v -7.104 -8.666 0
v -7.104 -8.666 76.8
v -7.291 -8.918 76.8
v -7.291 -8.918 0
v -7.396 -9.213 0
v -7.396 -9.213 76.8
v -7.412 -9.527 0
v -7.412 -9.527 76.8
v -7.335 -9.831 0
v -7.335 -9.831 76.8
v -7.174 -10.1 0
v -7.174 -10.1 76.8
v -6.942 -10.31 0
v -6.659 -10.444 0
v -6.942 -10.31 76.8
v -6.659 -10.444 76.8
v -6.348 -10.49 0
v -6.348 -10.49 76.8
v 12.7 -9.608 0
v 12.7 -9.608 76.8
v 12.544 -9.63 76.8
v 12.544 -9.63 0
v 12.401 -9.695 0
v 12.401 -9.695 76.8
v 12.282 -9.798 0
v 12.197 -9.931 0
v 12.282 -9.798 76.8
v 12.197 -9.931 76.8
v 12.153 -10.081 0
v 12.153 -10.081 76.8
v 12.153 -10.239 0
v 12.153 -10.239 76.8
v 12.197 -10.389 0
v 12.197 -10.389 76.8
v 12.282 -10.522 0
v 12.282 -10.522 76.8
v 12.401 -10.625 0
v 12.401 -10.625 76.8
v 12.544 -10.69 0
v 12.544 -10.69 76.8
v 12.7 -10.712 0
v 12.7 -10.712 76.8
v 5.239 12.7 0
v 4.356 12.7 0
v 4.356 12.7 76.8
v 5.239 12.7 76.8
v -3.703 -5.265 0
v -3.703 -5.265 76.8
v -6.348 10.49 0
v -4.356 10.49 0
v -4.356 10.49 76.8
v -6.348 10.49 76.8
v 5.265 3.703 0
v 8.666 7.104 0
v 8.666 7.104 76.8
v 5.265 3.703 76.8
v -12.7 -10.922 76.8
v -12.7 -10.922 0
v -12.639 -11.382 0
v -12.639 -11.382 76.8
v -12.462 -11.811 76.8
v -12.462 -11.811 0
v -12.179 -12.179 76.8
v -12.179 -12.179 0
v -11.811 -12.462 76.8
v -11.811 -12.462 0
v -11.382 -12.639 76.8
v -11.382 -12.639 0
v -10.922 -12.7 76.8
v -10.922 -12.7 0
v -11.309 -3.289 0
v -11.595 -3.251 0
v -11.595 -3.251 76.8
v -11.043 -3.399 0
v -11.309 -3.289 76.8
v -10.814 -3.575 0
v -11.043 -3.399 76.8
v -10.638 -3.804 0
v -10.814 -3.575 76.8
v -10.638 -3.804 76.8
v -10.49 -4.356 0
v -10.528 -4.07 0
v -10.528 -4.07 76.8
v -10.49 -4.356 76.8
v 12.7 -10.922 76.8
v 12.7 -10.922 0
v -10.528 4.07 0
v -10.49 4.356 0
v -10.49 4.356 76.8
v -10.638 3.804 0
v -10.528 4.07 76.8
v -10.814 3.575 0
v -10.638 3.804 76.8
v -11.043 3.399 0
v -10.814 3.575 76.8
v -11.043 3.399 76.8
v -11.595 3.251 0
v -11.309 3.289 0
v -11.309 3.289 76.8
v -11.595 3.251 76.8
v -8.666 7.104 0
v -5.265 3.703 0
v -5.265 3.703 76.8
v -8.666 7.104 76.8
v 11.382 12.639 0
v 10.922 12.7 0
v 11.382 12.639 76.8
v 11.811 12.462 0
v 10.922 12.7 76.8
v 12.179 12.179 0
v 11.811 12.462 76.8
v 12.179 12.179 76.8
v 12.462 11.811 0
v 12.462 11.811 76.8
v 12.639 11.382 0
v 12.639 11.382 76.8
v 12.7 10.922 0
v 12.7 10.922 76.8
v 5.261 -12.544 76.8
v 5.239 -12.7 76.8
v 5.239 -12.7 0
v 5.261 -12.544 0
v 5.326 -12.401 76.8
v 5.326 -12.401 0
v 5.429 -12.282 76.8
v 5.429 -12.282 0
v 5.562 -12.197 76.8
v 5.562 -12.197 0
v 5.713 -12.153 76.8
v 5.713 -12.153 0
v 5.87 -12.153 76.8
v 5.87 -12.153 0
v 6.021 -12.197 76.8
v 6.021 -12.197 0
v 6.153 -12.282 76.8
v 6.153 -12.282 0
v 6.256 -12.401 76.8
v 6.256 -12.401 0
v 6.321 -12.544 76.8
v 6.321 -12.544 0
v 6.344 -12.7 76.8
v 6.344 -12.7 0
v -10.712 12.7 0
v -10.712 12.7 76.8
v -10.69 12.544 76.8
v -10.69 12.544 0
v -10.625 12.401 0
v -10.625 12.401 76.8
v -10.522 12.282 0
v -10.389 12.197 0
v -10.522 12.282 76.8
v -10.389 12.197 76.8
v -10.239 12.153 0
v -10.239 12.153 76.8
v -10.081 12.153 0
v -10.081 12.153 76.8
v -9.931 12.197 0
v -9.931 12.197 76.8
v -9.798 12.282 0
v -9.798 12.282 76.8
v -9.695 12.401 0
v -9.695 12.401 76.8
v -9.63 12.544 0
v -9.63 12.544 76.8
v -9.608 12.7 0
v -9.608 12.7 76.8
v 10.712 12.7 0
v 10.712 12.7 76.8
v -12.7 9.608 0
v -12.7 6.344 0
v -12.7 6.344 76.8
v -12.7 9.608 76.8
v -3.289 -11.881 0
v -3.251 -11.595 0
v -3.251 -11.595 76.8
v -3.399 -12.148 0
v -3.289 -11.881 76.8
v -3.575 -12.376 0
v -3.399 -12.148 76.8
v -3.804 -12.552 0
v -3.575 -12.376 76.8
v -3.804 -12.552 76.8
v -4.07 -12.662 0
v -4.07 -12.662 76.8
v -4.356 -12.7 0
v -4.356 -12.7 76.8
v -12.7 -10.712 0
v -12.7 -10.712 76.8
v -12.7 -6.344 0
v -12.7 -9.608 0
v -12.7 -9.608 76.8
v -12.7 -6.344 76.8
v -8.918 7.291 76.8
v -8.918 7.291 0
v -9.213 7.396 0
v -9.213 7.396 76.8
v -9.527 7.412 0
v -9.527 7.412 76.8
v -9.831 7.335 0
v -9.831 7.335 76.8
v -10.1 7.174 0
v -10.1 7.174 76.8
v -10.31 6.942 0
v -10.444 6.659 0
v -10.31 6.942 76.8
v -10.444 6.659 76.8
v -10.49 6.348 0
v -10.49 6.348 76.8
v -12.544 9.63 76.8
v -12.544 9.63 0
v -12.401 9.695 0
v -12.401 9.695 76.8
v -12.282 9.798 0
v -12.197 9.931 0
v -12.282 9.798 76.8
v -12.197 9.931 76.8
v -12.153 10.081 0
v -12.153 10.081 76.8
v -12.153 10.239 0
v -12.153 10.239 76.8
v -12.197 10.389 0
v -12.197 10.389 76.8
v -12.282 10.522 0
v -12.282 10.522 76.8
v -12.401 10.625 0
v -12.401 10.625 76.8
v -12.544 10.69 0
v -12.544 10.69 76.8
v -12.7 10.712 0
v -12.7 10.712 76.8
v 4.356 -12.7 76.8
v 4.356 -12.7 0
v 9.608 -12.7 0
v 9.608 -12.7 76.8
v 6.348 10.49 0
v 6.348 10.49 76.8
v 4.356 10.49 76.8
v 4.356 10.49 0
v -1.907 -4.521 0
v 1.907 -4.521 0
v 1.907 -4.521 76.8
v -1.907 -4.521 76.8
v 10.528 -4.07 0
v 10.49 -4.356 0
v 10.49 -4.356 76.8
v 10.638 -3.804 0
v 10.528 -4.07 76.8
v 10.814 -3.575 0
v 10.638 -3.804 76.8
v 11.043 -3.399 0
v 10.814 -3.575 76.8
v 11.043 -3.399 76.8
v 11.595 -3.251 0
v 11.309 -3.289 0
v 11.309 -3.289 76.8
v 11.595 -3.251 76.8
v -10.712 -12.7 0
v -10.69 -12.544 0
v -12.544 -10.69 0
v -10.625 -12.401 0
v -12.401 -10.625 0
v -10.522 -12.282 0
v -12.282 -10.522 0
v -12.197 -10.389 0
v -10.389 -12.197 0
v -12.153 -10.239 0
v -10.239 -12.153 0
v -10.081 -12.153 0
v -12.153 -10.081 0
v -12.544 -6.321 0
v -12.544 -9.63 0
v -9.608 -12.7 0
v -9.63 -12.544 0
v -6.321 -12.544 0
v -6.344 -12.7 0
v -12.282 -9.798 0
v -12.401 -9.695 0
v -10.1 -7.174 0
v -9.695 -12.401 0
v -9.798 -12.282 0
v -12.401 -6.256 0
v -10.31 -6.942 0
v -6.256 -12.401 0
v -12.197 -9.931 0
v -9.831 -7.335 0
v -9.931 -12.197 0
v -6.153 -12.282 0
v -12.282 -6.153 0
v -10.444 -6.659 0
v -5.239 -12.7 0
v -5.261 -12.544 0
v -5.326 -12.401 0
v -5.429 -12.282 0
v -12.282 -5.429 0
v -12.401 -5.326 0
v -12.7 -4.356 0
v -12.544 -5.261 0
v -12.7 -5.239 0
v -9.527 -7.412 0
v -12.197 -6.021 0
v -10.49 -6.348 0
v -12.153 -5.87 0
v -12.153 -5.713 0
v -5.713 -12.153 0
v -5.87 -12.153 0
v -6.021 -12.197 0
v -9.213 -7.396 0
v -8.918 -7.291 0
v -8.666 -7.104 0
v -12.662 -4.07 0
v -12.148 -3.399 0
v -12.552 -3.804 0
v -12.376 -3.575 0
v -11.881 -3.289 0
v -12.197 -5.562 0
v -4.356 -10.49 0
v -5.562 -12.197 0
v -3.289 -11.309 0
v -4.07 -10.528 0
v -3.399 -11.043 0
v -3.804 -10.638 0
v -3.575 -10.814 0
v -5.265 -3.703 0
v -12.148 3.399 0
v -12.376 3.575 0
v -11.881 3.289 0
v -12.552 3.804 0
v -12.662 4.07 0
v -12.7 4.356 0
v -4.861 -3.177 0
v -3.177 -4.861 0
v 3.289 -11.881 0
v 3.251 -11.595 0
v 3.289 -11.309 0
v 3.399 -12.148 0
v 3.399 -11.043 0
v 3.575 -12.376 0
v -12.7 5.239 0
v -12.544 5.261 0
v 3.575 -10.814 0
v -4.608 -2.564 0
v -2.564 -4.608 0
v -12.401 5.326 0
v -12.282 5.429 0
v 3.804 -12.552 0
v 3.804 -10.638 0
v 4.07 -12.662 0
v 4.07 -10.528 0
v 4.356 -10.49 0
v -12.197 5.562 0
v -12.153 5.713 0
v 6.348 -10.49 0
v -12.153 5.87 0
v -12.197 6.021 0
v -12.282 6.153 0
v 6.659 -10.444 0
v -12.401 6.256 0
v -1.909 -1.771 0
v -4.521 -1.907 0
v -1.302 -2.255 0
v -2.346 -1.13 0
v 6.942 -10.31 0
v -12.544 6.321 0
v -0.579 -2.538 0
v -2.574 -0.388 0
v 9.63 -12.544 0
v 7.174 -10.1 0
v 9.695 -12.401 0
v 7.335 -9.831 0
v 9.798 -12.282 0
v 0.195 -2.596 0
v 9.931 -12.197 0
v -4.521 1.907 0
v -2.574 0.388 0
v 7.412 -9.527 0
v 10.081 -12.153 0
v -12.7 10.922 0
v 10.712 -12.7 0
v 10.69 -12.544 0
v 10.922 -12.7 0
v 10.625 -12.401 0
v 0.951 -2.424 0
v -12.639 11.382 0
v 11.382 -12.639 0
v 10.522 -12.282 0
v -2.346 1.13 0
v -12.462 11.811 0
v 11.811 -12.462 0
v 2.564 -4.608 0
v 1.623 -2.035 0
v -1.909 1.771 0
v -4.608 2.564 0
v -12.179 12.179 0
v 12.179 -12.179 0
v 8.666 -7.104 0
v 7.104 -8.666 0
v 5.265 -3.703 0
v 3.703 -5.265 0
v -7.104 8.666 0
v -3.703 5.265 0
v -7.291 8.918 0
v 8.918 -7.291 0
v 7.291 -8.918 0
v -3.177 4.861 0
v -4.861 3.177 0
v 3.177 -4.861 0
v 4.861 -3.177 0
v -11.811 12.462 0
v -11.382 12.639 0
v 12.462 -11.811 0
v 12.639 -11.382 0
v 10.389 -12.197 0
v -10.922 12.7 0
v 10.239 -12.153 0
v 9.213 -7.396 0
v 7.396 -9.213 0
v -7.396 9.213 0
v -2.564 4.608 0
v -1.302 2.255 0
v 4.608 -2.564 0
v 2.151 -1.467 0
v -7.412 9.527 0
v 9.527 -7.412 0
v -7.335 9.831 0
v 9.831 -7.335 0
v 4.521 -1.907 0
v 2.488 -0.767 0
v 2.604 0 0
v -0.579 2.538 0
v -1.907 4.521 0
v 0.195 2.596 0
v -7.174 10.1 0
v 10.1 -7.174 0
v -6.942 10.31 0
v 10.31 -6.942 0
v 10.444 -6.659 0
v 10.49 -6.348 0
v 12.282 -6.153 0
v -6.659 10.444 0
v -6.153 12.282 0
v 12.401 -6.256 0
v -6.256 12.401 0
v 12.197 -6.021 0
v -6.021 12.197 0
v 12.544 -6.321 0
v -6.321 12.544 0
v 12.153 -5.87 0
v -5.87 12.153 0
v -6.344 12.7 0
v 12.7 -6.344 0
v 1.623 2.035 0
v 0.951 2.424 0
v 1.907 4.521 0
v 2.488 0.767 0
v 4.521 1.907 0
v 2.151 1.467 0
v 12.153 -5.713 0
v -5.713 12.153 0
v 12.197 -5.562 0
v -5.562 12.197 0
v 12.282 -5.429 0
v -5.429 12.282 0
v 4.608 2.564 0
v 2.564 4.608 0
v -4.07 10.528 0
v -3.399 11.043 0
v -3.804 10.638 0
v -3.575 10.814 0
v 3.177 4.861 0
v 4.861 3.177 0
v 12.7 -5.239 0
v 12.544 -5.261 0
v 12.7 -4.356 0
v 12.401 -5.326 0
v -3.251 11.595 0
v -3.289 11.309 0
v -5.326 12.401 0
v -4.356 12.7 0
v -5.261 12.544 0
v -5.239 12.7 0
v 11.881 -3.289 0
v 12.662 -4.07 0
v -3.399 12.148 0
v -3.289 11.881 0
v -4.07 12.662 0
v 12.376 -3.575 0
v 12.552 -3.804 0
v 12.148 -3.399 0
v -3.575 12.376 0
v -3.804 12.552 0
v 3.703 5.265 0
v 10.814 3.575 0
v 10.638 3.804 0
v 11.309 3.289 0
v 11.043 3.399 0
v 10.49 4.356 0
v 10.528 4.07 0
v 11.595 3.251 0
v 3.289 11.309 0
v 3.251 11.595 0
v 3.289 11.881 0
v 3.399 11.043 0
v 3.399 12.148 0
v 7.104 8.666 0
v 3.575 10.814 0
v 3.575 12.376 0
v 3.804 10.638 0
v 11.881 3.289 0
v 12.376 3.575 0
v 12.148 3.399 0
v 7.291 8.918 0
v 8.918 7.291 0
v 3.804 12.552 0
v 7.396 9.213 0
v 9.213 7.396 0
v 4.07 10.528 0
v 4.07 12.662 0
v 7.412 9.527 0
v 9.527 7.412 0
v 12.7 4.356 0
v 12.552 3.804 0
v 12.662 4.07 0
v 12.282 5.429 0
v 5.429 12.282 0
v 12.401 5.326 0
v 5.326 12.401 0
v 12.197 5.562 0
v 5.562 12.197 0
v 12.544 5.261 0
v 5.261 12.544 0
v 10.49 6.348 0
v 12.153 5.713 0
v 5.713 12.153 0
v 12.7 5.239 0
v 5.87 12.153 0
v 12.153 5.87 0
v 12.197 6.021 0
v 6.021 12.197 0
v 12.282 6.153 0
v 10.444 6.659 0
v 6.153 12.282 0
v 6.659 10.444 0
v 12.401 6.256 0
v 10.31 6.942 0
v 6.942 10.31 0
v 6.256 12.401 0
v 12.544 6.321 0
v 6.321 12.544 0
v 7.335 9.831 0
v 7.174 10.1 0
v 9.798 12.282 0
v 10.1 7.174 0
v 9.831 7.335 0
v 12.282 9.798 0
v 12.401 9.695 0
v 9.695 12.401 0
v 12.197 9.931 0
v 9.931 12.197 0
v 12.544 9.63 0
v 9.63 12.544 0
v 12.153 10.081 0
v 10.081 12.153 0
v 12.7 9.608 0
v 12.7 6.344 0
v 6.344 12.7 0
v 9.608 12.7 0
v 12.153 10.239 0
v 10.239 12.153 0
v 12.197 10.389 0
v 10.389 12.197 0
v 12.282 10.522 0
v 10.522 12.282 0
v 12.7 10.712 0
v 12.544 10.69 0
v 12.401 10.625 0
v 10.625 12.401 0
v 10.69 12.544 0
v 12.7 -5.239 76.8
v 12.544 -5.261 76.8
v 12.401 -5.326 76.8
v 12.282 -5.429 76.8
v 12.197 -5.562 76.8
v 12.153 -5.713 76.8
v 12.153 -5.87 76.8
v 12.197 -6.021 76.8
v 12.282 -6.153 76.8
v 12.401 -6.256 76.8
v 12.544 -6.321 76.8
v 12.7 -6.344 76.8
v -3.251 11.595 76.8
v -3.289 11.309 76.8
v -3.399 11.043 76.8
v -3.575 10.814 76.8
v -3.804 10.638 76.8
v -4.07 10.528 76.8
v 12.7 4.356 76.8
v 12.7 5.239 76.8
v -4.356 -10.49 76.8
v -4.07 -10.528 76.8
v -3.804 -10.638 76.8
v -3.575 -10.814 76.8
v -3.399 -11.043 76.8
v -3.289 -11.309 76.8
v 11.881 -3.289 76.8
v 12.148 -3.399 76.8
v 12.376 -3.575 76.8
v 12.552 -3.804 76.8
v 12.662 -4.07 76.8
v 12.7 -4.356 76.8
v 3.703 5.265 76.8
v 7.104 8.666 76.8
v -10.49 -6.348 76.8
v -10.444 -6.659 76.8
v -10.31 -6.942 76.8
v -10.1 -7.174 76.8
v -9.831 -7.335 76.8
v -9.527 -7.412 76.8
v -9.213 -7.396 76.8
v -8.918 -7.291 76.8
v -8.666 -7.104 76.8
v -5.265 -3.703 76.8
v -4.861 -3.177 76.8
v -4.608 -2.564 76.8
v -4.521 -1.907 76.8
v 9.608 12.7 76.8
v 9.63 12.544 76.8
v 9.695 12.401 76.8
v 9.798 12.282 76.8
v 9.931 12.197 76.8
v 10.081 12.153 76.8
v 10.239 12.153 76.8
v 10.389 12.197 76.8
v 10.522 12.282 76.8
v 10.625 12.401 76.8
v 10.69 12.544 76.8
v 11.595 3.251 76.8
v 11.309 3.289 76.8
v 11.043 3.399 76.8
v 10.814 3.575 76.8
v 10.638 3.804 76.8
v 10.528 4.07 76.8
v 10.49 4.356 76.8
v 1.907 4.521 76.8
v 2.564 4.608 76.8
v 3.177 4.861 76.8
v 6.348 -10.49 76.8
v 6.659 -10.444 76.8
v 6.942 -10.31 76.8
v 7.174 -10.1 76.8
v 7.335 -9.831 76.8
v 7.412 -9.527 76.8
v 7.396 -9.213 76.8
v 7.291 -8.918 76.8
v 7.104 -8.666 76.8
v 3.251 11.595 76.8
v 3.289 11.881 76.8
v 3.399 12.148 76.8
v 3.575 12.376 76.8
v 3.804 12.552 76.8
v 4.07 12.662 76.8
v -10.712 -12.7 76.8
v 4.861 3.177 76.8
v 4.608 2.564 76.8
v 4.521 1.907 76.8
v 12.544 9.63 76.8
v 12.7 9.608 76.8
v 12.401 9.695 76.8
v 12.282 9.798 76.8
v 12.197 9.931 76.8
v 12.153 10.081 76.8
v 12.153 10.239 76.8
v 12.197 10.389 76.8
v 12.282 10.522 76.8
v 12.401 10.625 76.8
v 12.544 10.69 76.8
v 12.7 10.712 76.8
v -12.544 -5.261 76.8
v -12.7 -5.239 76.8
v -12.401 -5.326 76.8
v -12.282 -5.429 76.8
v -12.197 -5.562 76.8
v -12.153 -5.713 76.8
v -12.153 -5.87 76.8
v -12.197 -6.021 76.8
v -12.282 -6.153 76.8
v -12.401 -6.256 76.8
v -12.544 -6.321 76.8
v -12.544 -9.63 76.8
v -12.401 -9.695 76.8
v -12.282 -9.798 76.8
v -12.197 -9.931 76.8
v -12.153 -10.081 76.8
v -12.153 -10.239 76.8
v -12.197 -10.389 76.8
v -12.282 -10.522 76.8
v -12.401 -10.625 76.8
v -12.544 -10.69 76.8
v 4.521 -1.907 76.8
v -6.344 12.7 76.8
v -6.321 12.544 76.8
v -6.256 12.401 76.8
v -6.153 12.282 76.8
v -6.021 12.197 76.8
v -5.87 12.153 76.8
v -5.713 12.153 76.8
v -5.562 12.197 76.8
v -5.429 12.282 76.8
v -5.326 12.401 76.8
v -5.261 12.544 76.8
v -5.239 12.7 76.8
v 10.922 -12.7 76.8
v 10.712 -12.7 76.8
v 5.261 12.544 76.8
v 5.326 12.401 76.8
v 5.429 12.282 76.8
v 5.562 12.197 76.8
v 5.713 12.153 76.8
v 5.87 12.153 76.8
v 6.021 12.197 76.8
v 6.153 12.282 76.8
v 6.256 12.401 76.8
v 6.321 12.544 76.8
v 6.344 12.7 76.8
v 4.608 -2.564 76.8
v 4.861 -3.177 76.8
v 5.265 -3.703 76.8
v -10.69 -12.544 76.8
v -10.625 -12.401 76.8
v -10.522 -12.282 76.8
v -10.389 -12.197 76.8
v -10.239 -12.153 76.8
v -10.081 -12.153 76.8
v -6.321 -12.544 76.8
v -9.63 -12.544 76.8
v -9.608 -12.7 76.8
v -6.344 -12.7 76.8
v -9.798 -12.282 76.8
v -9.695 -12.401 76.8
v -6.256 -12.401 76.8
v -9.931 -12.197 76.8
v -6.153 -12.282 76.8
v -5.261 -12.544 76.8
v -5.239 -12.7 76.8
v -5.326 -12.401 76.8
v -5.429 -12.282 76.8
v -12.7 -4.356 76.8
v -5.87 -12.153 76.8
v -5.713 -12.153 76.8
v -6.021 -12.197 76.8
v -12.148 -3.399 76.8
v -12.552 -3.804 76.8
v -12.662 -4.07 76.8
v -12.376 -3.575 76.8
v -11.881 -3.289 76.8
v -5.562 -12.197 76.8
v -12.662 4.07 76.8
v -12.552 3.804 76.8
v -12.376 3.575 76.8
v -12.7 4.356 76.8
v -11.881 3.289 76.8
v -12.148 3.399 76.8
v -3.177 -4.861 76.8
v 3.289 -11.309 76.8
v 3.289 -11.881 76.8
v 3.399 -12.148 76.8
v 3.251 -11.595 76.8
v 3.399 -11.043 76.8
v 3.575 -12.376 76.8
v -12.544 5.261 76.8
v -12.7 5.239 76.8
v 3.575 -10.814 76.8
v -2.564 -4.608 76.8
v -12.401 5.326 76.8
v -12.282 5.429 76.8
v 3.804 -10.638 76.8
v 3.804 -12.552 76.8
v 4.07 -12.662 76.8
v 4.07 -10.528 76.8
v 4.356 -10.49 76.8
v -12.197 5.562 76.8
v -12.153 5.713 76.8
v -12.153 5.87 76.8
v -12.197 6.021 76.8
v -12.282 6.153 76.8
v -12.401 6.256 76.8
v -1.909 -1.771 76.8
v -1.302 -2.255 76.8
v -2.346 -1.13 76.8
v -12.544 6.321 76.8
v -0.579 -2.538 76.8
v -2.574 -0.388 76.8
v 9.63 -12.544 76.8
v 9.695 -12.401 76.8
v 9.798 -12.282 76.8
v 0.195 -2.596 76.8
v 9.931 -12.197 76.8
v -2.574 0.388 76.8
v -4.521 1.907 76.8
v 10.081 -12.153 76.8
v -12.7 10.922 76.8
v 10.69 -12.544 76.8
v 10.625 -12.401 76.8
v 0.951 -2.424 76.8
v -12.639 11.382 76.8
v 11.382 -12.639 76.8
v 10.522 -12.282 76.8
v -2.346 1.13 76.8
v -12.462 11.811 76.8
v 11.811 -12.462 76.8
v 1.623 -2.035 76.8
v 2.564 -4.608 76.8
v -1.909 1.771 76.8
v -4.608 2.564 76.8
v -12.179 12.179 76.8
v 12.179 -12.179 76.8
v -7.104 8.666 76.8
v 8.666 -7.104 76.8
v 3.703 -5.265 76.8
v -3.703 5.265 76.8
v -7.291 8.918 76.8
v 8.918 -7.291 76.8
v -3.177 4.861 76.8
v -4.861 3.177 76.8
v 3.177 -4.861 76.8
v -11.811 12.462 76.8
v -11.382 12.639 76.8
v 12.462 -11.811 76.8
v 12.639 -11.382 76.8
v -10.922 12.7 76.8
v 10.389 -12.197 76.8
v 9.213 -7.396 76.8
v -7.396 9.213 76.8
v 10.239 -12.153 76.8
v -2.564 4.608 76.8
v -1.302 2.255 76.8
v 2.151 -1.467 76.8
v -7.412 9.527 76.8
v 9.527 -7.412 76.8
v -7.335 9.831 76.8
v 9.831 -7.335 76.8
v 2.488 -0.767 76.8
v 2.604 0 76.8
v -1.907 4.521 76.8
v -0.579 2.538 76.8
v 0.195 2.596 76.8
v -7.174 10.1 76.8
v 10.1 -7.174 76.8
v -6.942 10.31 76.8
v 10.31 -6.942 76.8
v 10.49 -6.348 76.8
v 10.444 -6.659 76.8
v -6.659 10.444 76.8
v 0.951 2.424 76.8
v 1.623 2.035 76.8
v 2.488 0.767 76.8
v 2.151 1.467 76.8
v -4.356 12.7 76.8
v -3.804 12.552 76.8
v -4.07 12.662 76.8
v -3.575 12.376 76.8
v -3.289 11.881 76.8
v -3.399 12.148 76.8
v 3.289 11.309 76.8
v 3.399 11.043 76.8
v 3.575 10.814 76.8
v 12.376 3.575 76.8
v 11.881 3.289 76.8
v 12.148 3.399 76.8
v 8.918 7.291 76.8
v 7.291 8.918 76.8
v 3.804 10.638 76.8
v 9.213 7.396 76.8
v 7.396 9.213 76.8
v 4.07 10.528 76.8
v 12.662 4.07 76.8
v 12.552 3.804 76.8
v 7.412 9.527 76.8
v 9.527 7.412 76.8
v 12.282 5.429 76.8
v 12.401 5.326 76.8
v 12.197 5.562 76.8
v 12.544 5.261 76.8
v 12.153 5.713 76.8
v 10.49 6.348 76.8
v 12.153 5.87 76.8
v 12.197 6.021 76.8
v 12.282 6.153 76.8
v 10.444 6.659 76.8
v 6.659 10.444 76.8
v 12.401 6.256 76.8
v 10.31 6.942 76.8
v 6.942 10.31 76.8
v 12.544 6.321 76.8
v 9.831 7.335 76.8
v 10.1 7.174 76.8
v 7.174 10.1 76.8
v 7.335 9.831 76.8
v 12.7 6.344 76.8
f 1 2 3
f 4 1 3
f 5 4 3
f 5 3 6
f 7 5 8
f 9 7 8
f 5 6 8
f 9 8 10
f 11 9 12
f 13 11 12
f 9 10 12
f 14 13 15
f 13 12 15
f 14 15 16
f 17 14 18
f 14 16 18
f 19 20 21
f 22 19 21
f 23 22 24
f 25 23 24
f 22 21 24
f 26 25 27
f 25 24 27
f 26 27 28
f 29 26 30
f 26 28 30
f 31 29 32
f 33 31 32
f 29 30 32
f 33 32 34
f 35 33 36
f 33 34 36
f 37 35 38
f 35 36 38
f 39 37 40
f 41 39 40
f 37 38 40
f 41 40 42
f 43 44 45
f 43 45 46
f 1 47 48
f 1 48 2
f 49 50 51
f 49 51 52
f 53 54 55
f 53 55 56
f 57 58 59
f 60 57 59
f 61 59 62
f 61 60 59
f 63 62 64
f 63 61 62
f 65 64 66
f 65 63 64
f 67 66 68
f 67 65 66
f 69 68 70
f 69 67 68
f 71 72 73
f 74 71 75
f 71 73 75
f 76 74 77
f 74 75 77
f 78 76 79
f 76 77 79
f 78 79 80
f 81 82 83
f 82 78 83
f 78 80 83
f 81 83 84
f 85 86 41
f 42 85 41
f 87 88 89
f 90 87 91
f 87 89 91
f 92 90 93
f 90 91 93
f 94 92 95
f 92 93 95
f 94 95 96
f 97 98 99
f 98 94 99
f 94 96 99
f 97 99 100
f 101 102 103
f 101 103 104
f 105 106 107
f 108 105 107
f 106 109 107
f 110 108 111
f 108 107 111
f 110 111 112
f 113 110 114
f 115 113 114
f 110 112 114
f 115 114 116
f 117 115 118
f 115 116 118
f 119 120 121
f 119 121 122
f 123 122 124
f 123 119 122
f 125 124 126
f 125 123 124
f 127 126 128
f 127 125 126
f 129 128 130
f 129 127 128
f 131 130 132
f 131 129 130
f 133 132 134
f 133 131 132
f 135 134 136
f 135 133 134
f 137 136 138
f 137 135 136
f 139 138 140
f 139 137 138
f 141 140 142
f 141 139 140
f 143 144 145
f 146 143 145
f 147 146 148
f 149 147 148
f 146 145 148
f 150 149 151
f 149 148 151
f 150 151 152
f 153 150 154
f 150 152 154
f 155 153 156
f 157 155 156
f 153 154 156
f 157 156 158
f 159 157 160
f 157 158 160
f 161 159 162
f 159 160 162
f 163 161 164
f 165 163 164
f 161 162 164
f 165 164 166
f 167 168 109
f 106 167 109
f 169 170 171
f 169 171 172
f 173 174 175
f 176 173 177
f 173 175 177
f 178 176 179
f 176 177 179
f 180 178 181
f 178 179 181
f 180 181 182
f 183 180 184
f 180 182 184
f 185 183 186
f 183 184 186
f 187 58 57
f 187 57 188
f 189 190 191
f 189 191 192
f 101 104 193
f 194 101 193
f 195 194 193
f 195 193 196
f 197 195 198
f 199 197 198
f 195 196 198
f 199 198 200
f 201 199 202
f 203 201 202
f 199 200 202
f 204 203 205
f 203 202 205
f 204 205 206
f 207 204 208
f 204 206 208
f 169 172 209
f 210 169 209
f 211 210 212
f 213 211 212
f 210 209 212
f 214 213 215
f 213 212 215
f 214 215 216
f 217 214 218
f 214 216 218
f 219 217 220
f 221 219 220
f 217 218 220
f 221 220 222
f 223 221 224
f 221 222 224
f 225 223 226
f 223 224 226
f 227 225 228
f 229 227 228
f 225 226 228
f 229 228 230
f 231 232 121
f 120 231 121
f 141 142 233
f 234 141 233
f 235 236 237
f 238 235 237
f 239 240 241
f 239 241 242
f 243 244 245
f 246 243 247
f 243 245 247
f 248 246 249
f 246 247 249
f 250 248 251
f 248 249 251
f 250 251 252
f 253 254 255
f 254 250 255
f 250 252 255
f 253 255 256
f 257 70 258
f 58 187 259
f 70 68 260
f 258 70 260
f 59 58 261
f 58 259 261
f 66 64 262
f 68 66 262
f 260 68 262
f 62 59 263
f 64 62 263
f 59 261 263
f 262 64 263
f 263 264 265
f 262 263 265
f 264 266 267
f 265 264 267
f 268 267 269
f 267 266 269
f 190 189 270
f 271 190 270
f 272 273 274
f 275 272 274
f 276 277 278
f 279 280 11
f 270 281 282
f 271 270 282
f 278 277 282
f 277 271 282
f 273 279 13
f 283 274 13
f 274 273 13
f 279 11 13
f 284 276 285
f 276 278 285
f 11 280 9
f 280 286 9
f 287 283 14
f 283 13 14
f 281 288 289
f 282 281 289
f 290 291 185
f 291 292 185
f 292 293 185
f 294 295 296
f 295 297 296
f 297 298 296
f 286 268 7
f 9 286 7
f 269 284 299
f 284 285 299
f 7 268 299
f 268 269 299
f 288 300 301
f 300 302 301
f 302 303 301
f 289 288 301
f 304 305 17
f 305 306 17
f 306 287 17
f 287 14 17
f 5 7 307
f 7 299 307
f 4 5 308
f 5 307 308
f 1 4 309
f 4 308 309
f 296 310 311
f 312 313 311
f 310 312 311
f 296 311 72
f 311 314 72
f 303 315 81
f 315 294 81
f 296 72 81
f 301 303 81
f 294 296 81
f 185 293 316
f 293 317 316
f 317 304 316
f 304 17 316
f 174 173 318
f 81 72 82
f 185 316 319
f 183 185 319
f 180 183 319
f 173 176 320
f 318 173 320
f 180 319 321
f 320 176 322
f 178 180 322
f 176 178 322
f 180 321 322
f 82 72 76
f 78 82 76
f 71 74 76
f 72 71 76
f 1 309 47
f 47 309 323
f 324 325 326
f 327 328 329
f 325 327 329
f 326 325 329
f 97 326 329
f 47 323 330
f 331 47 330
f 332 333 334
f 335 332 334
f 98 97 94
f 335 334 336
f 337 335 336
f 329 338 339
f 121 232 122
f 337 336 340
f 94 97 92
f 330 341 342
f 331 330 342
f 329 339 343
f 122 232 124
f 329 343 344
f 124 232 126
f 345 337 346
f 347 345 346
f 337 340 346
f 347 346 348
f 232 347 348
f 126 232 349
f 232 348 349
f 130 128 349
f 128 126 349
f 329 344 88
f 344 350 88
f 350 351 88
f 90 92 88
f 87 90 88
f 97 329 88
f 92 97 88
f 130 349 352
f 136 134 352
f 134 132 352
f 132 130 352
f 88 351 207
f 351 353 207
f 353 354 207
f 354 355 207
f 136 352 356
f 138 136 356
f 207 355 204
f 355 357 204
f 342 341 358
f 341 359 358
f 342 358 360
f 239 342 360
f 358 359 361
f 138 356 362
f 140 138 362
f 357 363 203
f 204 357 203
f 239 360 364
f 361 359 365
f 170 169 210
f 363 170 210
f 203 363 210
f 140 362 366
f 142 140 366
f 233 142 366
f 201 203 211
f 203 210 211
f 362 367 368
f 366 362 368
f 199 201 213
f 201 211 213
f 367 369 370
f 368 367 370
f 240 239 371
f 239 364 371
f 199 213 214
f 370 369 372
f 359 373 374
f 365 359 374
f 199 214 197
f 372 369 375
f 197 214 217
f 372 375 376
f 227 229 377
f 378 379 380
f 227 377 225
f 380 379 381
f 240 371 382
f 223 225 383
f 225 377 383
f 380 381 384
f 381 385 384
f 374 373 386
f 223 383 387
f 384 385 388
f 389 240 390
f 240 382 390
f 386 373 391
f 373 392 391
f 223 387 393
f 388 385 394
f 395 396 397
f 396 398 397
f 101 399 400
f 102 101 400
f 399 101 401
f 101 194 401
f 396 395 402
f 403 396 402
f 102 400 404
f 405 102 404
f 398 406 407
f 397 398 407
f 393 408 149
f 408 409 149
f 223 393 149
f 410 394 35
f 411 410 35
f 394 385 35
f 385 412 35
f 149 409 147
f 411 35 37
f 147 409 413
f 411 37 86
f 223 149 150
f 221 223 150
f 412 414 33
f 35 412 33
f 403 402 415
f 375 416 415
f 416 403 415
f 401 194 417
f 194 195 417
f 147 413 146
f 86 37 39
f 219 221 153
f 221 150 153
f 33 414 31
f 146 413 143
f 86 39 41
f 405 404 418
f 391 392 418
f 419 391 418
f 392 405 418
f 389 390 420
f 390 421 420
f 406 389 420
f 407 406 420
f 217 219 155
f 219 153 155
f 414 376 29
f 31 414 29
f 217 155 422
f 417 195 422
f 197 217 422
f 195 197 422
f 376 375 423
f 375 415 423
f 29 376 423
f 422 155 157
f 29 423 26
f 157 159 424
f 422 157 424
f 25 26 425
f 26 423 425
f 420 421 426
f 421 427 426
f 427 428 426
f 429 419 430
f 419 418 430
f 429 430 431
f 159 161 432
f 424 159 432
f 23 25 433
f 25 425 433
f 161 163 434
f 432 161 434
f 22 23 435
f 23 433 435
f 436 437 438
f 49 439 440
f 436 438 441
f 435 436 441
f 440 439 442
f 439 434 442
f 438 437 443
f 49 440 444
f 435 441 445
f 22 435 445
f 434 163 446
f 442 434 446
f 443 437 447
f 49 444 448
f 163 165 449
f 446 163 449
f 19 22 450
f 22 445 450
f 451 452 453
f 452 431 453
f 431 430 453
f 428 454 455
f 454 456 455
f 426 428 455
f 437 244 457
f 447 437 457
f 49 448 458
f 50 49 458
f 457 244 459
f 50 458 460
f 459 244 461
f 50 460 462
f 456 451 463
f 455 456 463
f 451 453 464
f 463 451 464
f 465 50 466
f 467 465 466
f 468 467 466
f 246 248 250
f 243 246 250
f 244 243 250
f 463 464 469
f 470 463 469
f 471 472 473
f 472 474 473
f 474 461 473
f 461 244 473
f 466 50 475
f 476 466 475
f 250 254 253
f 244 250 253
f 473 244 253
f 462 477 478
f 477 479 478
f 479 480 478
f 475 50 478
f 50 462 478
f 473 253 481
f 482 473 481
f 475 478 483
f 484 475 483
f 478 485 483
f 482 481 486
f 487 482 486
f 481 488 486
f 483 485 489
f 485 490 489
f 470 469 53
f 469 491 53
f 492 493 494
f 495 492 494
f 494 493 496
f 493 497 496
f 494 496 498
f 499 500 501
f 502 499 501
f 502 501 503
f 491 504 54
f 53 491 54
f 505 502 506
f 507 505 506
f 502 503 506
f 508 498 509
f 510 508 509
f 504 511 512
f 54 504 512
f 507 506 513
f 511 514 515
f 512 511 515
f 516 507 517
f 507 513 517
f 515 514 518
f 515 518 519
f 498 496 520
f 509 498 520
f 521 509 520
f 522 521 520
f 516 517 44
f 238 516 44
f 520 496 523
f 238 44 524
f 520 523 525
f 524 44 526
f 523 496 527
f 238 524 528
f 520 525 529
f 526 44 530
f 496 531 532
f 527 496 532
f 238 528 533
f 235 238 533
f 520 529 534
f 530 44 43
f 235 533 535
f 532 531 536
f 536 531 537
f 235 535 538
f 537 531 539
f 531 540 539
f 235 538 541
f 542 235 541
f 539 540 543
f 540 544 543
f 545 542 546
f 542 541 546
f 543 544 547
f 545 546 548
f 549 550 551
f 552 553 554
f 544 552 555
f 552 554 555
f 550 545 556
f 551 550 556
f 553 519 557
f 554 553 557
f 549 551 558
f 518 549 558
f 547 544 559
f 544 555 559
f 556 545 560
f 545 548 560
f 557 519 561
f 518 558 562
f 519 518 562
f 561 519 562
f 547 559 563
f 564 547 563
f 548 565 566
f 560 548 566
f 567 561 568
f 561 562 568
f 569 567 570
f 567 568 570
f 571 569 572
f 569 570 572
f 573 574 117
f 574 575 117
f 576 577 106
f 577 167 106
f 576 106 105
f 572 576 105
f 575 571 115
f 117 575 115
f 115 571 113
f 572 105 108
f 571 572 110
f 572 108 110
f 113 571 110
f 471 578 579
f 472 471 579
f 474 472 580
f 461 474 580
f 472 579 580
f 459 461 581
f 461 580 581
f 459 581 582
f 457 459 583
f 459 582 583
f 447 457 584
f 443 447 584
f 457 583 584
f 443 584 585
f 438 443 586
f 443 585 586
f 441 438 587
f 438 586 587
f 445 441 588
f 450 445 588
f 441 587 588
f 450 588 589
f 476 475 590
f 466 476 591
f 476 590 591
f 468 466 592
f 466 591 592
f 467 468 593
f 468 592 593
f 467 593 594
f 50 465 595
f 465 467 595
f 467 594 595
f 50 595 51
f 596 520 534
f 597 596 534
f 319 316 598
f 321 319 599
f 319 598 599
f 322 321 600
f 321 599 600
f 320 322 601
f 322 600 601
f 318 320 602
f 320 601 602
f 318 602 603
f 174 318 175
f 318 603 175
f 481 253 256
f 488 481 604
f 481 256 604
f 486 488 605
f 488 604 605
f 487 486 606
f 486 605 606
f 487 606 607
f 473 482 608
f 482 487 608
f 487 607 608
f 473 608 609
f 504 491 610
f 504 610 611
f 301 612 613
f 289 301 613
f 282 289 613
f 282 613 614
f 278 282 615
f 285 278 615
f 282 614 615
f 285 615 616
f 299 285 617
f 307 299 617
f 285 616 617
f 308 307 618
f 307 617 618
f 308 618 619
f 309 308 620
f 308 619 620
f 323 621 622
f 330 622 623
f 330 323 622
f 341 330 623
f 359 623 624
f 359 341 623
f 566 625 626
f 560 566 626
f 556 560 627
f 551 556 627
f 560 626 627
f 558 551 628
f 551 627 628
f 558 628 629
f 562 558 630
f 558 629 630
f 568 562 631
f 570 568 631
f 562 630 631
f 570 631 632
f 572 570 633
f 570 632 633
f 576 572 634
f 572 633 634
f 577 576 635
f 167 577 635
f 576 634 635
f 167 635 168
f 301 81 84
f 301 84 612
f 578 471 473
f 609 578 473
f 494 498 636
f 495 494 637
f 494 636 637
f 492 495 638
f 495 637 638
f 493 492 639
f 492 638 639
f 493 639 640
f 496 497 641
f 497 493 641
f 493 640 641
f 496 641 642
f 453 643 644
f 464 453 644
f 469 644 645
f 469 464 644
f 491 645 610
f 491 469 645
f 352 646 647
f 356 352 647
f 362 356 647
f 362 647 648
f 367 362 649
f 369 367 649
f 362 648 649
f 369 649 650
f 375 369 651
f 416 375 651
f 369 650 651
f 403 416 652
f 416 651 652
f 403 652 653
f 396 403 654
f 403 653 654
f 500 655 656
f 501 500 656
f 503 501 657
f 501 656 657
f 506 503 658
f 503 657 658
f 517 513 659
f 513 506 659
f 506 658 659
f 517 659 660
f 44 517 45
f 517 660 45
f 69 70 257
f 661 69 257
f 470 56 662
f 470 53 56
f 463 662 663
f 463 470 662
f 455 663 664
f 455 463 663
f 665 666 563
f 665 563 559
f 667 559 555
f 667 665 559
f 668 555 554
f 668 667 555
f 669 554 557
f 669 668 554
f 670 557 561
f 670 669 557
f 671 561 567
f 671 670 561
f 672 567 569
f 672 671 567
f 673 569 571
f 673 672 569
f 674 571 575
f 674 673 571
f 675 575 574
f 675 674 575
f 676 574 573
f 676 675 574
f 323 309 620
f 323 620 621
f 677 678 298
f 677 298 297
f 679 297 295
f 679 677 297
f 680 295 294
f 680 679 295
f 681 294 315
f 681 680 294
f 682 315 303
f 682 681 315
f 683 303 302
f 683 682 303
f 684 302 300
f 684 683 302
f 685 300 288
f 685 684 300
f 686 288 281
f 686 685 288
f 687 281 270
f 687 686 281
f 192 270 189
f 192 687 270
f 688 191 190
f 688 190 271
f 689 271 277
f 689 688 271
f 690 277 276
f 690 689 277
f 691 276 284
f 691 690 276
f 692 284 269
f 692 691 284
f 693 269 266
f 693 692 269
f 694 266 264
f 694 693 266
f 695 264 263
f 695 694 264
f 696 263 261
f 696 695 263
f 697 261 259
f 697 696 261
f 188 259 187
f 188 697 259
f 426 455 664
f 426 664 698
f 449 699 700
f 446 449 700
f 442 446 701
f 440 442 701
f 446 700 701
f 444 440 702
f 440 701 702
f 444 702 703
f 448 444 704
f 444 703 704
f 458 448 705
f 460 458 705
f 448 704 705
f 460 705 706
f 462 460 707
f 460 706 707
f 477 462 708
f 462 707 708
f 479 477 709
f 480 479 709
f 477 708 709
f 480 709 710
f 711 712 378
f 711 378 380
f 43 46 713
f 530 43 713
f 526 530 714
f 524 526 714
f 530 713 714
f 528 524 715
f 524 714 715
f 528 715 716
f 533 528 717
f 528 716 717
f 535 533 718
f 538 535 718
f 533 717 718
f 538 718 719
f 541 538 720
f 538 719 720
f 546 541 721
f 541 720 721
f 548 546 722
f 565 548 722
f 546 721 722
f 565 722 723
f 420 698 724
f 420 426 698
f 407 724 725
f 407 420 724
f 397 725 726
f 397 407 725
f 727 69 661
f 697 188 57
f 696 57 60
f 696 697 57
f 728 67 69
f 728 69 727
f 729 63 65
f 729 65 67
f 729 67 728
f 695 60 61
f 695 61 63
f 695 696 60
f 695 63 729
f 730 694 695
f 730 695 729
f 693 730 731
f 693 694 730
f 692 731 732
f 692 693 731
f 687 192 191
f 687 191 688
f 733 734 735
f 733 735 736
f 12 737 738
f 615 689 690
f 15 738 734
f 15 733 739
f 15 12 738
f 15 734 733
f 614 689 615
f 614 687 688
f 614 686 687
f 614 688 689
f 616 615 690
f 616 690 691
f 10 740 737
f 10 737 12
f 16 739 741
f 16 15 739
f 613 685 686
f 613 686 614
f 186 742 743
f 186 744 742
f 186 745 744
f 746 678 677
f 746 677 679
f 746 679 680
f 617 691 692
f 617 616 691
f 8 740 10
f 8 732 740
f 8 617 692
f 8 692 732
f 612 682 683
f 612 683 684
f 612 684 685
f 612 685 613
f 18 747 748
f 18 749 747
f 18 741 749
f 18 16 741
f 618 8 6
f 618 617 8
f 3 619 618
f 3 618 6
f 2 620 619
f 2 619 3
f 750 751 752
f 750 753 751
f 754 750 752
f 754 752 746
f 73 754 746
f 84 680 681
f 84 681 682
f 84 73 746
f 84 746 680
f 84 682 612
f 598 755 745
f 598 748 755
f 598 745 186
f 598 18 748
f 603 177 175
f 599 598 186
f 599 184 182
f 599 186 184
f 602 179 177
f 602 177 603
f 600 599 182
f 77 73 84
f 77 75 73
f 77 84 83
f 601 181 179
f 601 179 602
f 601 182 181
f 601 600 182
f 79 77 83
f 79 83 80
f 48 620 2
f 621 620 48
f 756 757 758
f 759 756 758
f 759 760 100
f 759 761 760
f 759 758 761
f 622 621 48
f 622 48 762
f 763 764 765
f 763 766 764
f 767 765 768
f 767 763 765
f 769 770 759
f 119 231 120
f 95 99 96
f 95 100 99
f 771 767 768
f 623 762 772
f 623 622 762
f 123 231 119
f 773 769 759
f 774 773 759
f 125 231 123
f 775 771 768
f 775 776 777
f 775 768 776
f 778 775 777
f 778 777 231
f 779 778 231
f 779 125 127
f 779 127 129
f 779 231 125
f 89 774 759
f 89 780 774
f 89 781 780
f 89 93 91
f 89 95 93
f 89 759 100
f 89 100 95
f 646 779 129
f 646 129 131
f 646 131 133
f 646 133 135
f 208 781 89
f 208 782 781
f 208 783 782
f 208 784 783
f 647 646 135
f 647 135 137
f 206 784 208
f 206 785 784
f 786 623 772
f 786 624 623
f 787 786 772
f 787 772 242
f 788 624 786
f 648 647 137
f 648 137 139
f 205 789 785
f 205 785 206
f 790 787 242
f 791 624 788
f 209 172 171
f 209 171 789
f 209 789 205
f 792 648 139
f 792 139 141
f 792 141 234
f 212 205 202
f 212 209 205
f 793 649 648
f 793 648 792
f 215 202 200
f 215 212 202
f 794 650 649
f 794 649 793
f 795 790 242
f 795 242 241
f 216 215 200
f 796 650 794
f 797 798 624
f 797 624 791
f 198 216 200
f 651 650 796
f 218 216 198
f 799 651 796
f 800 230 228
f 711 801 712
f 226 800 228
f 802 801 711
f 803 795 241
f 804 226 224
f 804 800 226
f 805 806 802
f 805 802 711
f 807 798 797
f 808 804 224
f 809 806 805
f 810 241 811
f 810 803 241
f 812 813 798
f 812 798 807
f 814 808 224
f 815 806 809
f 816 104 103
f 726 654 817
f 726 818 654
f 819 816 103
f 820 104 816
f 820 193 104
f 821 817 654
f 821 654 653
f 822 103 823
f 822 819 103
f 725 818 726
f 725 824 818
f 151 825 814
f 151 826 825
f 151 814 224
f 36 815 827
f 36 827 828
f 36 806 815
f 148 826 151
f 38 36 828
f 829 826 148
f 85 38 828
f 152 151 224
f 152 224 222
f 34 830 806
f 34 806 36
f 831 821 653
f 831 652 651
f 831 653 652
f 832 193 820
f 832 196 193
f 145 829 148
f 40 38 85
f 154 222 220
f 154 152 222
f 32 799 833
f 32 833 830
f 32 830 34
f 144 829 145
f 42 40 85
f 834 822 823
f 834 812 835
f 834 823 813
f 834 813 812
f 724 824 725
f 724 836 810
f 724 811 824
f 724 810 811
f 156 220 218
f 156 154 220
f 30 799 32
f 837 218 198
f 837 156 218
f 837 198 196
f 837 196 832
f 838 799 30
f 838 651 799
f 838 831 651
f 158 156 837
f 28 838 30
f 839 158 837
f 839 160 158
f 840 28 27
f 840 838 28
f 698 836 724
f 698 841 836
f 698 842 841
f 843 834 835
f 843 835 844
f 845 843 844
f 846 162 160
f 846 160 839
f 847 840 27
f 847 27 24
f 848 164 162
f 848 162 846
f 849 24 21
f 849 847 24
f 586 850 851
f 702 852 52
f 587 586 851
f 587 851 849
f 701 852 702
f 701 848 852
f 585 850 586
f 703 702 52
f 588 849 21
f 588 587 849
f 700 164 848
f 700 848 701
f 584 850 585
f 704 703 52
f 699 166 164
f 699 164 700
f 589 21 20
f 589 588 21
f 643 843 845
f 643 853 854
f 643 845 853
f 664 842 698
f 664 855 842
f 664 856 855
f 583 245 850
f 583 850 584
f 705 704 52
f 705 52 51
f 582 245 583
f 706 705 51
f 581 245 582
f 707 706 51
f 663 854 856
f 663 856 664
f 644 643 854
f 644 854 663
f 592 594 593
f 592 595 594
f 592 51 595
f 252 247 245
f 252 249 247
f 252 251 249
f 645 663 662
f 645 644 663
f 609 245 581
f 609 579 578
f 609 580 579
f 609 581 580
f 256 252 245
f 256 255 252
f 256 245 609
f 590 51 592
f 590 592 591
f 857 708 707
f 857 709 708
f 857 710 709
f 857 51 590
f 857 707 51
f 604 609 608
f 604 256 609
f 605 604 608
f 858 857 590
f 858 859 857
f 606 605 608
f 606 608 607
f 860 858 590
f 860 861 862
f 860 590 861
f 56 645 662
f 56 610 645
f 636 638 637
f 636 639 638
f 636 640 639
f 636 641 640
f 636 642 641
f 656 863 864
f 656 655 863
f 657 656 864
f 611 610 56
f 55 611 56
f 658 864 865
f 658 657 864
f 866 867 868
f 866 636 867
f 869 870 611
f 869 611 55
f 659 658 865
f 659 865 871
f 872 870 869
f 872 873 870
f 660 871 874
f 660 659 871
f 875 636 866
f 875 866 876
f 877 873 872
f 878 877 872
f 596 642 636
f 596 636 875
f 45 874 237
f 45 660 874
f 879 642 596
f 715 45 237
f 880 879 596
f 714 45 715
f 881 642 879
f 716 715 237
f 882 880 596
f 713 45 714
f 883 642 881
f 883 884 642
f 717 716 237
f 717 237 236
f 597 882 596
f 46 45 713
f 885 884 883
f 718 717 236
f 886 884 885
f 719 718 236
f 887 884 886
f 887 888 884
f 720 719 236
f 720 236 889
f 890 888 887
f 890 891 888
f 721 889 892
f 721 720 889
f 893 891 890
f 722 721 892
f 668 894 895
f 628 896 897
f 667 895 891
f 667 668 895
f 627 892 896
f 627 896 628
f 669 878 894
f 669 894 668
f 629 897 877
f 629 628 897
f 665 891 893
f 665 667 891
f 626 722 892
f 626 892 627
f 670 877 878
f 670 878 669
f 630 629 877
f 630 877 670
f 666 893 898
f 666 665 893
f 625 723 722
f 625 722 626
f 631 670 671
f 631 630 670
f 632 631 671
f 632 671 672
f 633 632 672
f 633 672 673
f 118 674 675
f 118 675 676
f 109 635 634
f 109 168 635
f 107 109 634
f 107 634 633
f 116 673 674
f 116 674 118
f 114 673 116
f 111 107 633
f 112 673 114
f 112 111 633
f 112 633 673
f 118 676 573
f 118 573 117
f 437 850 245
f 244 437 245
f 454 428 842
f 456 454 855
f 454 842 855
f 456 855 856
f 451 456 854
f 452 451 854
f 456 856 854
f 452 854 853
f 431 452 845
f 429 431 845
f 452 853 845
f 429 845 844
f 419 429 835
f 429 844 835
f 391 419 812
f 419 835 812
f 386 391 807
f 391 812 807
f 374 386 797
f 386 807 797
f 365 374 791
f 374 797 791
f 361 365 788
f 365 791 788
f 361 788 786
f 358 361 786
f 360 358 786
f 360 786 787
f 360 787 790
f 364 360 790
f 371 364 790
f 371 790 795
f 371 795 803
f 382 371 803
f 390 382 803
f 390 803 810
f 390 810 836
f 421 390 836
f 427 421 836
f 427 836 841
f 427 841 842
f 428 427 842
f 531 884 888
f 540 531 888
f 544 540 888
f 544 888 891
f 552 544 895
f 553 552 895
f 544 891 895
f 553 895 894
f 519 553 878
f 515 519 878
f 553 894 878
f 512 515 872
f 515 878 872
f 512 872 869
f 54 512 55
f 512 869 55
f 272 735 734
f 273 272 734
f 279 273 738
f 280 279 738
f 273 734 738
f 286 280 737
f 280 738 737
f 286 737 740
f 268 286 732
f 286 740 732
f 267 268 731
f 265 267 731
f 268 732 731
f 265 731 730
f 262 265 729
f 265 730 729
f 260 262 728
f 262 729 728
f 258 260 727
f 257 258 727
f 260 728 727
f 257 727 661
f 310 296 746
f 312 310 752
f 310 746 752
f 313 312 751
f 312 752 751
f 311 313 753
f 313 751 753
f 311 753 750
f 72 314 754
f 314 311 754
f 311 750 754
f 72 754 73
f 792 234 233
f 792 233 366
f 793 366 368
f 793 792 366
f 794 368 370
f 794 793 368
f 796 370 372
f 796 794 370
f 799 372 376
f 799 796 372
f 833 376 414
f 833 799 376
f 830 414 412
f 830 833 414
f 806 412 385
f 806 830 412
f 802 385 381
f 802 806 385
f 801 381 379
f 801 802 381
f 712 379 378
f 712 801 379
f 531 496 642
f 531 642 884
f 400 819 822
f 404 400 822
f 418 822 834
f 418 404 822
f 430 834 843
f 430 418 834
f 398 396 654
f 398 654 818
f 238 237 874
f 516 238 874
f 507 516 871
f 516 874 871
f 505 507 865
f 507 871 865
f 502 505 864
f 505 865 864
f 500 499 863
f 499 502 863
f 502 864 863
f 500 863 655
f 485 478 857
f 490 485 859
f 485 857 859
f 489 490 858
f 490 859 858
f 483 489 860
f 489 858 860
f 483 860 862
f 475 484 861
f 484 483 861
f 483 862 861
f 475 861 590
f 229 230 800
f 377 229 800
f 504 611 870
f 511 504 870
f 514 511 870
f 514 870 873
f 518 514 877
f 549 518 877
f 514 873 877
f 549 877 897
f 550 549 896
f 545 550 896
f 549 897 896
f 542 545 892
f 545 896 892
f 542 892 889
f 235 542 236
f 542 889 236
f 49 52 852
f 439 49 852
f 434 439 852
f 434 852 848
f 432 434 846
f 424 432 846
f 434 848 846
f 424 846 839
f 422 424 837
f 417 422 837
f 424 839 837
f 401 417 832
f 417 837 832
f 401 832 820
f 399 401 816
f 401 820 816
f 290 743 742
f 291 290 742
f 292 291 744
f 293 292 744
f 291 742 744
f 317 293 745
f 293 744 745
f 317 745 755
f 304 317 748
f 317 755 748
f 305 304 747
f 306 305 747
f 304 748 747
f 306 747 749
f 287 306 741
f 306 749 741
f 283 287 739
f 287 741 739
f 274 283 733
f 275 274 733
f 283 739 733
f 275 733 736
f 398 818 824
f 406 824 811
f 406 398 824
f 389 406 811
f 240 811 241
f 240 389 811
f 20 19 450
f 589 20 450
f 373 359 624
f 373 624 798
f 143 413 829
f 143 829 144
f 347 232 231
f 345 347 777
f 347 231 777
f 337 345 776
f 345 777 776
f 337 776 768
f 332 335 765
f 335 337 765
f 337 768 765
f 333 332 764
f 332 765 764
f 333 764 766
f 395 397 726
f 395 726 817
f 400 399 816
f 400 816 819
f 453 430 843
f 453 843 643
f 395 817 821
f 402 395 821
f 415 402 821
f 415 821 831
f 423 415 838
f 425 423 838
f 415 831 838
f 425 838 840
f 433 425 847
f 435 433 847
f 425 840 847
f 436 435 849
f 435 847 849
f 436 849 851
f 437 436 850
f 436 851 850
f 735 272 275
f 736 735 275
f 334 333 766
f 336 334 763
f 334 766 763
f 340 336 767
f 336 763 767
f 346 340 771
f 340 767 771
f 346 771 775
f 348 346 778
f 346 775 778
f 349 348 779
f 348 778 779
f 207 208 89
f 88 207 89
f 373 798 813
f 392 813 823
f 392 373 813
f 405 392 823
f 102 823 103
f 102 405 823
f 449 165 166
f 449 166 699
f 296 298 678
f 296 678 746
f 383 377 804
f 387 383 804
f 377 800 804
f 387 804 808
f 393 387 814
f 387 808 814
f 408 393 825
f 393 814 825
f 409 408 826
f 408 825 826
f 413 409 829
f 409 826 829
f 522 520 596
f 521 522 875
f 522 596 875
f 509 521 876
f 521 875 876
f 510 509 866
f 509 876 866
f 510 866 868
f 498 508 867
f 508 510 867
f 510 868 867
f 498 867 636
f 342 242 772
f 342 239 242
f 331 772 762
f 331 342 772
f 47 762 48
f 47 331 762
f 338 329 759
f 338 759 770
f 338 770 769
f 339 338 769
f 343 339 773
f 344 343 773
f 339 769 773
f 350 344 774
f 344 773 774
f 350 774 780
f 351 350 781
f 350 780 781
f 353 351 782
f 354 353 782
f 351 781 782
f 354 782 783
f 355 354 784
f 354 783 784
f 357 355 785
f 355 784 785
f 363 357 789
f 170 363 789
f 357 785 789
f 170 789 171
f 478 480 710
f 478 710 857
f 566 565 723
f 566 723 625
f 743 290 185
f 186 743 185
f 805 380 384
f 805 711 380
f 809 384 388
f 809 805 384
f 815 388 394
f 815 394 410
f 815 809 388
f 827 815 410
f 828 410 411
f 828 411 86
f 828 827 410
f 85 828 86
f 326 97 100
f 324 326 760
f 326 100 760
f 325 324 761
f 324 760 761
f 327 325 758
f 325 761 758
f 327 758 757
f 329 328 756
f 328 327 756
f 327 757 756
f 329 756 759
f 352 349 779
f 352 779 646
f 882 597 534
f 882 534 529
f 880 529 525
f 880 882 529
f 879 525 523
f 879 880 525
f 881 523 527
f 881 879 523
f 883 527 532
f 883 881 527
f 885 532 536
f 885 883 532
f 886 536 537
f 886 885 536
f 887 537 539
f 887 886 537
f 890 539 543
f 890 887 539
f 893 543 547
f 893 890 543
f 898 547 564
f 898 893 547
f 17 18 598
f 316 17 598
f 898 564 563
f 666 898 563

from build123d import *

# Parameters (mm, degrees)
SKETCH3_W           = 25.4
SKETCH3_H           = 25.4
BOSS_EXTRUDE1_DEPTH = 76.8
SKETCH4_R           = 2.6035
CUT_EXTRUDE1_DEPTH  = 79.872175068
CUT_EXTRUDE2_DEPTH  = 79.872175068
FILLET1_R           = 2.54
FILLET2_R           = 1.778


with BuildPart() as part:
    # Sketch3 → Boss-Extrude1 (new body)
    with BuildSketch(Plane.XY):
        Rectangle(SKETCH3_W, SKETCH3_H)
    extrude(amount=BOSS_EXTRUDE1_DEPTH)

    # Sketch4 → Cut-Extrude1 (cut, through all)
    with BuildSketch(Plane.XY.offset(76.8)):
        with BuildLine():
            Line((3.2512, 12.7), (-3.2512, 12.7))
            Line((-3.2512, 12.7), (-3.2512, 10.4902))
            Line((-3.2512, 10.4902), (-6.348478019, 10.4902))
            ThreePointArc((-6.348478019, 10.4902), (-7.335478831, 9.830707141), (-7.103895736, 8.666460301))
            Line((-7.103895736, 8.666460301), (-2.958635435, 4.5212))
            Line((-2.958635435, 4.5212), (2.958635435, 4.5212))
            Line((2.958635435, 4.5212), (7.103895736, 8.666460301))
            ThreePointArc((7.103895736, 8.666460301), (7.335478831, 9.830707141), (6.348478019, 10.4902))
            Line((6.348478019, 10.4902), (3.2512, 10.4902))
            Line((3.2512, 10.4902), (3.2512, 12.7))
        make_face()
        with BuildLine():
            Line((12.7, -3.2512), (12.7, 3.2512))
            Line((12.7, 3.2512), (10.4902, 3.2512))
            Line((10.4902, 3.2512), (10.4902, 6.348478019))
            ThreePointArc((10.4902, 6.348478019), (9.830707141, 7.335478831), (8.666460301, 7.103895736))
            Line((8.666460301, 7.103895736), (4.5212, 2.958635435))
            Line((4.5212, 2.958635435), (4.5212, -2.958635435))
            Line((4.5212, -2.958635435), (8.666460301, -7.103895736))
            ThreePointArc((8.666460301, -7.103895736), (9.830707141, -7.335478831), (10.4902, -6.348478019))
            Line((10.4902, -6.348478019), (10.4902, -3.2512))
            Line((10.4902, -3.2512), (12.7, -3.2512))
        make_face()
        with BuildLine():
            Line((-3.2512, -10.4902), (-3.2512, -12.7))
            Line((-3.2512, -12.7), (3.2512, -12.7))
            Line((3.2512, -12.7), (3.2512, -10.4902))
            Line((3.2512, -10.4902), (6.348478019, -10.4902))
            ThreePointArc((6.348478019, -10.4902), (7.335478831, -9.830707141), (7.103895736, -8.666460301))
            Line((7.103895736, -8.666460301), (2.958635435, -4.5212))
            Line((2.958635435, -4.5212), (-2.958635435, -4.5212))
            Line((-2.958635435, -4.5212), (-7.103895736, -8.666460301))
            ThreePointArc((-7.103895736, -8.666460301), (-7.335478831, -9.830707141), (-6.348478019, -10.4902))
            Line((-6.348478019, -10.4902), (-3.2512, -10.4902))
        make_face()
        with BuildLine():
            Line((-10.4902, 3.2512), (-12.7, 3.2512))
            Line((-12.7, 3.2512), (-12.7, -3.2512))
            Line((-12.7, -3.2512), (-10.4902, -3.2512))
            Line((-10.4902, -3.2512), (-10.4902, -6.348478019))
            ThreePointArc((-10.4902, -6.348478019), (-9.830707141, -7.335478831), (-8.666460301, -7.103895736))
            Line((-8.666460301, -7.103895736), (-4.5212, -2.958635435))
            Line((-4.5212, -2.958635435), (-4.5212, 2.958635435))
            Line((-4.5212, 2.958635435), (-8.666460301, 7.103895736))
            ThreePointArc((-8.666460301, 7.103895736), (-9.830707141, 7.335478831), (-10.4902, 6.348478019))
            Line((-10.4902, 6.348478019), (-10.4902, 3.2512))
        make_face()
        Circle(SKETCH4_R)
    extrude(amount=-CUT_EXTRUDE1_DEPTH, mode=Mode.SUBTRACT)

    # Sketch5 → Cut-Extrude2 (cut, through all)
    with BuildSketch(Plane.XY.offset(76.8)):
        with BuildLine():
            ThreePointArc((-11.5951, 3.2512), (-12.376382283, 3.574817717), (-12.7, 4.3561))
            Line((-12.7, 4.3561), (-12.7, 3.2512))
            Line((-12.7, 3.2512), (-11.5951, 3.2512))
        make_face()
        with BuildLine():
            ThreePointArc((-10.4902, 4.3561), (-10.813817717, 3.574817717), (-11.5951, 3.2512))
            Line((-11.5951, 3.2512), (-10.4902, 3.2512))
            Line((-10.4902, 3.2512), (-10.4902, 4.3561))
        make_face()
        with BuildLine():
            Line((-12.7, -3.2512), (-12.7, -4.3561))
            ThreePointArc((-12.7, -4.3561), (-12.376382283, -3.574817717), (-11.5951, -3.2512))
            Line((-11.5951, -3.2512), (-12.7, -3.2512))
        make_face()
        with BuildLine():
            Line((-10.4902, -3.2512), (-11.5951, -3.2512))
            ThreePointArc((-11.5951, -3.2512), (-10.813817717, -3.574817717), (-10.4902, -4.3561))
            Line((-10.4902, -4.3561), (-10.4902, -3.2512))
        make_face()
        with BuildLine():
            Line((-3.2512, -11.595100007), (-3.2512, -10.4902))
            Line((-3.2512, -10.4902), (-4.3561, -10.4902))
            ThreePointArc((-4.3561, -10.4902), (-3.574817715, -10.81381772), (-3.2512, -11.595100007))
        make_face()
        with BuildLine():
            Line((-3.2512, -12.7), (-3.2512, -11.595100007))
            ThreePointArc((-3.2512, -11.595100007), (-3.57481772, -12.376382285), (-4.3561, -12.7))
            Line((-4.3561, -12.7), (-3.2512, -12.7))
        make_face()
        with BuildLine():
            Line((3.2512, -10.4902), (3.2512, -11.5951))
            ThreePointArc((3.2512, -11.5951), (3.574817718, -10.813817717), (4.3561, -10.4902))
            Line((4.3561, -10.4902), (3.2512, -10.4902))
        make_face()
        with BuildLine():
            Line((3.2512, -12.7), (4.3561, -12.7))
            ThreePointArc((4.3561, -12.7), (3.574817717, -12.376382282), (3.2512, -11.5951))
            Line((3.2512, -11.5951), (3.2512, -12.7))
        make_face()
        with BuildLine():
            Line((11.5951, -3.2512), (10.4902, -3.2512))
            Line((10.4902, -3.2512), (10.4902, -4.3561))
            ThreePointArc((10.4902, -4.3561), (10.813817717, -3.574817717), (11.5951, -3.2512))
        make_face()
        with BuildLine():
            Line((12.7, -3.2512), (11.5951, -3.2512))
            ThreePointArc((11.5951, -3.2512), (12.376382283, -3.574817717), (12.7, -4.3561))
            Line((12.7, -4.3561), (12.7, -3.2512))
        make_face()
        with BuildLine():
            Line((10.4902, 3.2512), (11.5951, 3.2512))
            ThreePointArc((11.5951, 3.2512), (10.813817717, 3.574817717), (10.4902, 4.3561))
            Line((10.4902, 4.3561), (10.4902, 3.2512))
        make_face()
        with BuildLine():
            Line((12.7, 3.2512), (12.7, 4.3561))
            ThreePointArc((12.7, 4.3561), (12.376382283, 3.574817717), (11.5951, 3.2512))
            Line((11.5951, 3.2512), (12.7, 3.2512))
        make_face()
        with BuildLine():
            Line((3.2512, 12.7), (3.2512, 11.595099996))
            ThreePointArc((3.2512, 11.595099996), (3.574817716, 12.376382281), (4.3561, 12.7))
            Line((4.3561, 12.7), (3.2512, 12.7))
        make_face()
        with BuildLine():
            Line((3.2512, 11.595099996), (3.2512, 10.4902))
            Line((3.2512, 10.4902), (4.3561, 10.4902))
            ThreePointArc((4.3561, 10.4902), (3.574817719, 10.813817716), (3.2512, 11.595099996))
        make_face()
        with BuildLine():
            Line((-3.2512, 12.7), (-4.3561, 12.7))
            ThreePointArc((-4.3561, 12.7), (-3.574817717, 12.376382283), (-3.2512, 11.5951))
            Line((-3.2512, 11.5951), (-3.2512, 12.7))
        make_face()
        with BuildLine():
            Line((-3.2512, 10.4902), (-3.2512, 11.5951))
            ThreePointArc((-3.2512, 11.5951), (-3.574817717, 10.813817717), (-4.3561, 10.4902))
            Line((-4.3561, 10.4902), (-3.2512, 10.4902))
        make_face()
        with BuildLine():
            ThreePointArc((-12.7, 5.23875), (-12.14755, 5.7912), (-12.7, 6.34365))
            Line((-12.7, 6.34365), (-12.7, 5.23875))
        make_face()
        with BuildLine():
            ThreePointArc((-12.7, 9.60755), (-12.14755, 10.16), (-12.7, 10.71245))
            Line((-12.7, 10.71245), (-12.7, 9.60755))
        make_face()
        with BuildLine():
            ThreePointArc((-10.71245, 12.7), (-10.16, 12.14755), (-9.60755, 12.7))
            Line((-9.60755, 12.7), (-10.71245, 12.7))
        make_face()
        with BuildLine():
            ThreePointArc((-6.34365, 12.7), (-5.7912, 12.14755), (-5.23875, 12.7))
            Line((-5.23875, 12.7), (-6.34365, 12.7))
        make_face()
        with BuildLine():
            Line((6.34365, 12.7), (5.23875, 12.7))
            ThreePointArc((5.23875, 12.7), (5.7912, 12.14755), (6.34365, 12.7))
        make_face()
        with BuildLine():
            Line((10.71245, 12.7), (9.60755, 12.7))
            ThreePointArc((9.60755, 12.7), (10.16, 12.14755), (10.71245, 12.7))
        make_face()
        with BuildLine():
            Line((12.7, 10.71245), (12.7, 9.60755))
            ThreePointArc((12.7, 9.60755), (12.14755, 10.16), (12.7, 10.71245))
        make_face()
        with BuildLine():
            Line((12.7, 6.34365), (12.7, 5.23875))
            ThreePointArc((12.7, 5.23875), (12.14755, 5.7912), (12.7, 6.34365))
        make_face()
        with BuildLine():
            Line((-12.7, -6.34365), (-12.7, -5.23875))
            ThreePointArc((-12.7, -5.23875), (-12.14755, -5.7912), (-12.7, -6.34365))
        make_face()
        with BuildLine():
            Line((-12.7, -10.71245), (-12.7, -9.60755))
            ThreePointArc((-12.7, -9.60755), (-12.14755, -10.16), (-12.7, -10.71245))
        make_face()
        with BuildLine():
            Line((-10.71245, -12.7), (-9.60755, -12.7))
            ThreePointArc((-9.60755, -12.7), (-10.16, -12.14755), (-10.71245, -12.7))
        make_face()
        with BuildLine():
            Line((-6.34365, -12.7), (-5.23875, -12.7))
            ThreePointArc((-5.23875, -12.7), (-5.7912, -12.14755), (-6.34365, -12.7))
        make_face()
        with BuildLine():
            Line((12.7, -10.71245), (12.7, -9.60755))
            ThreePointArc((12.7, -9.60755), (12.14755, -10.16), (12.7, -10.71245))
        make_face()
        with BuildLine():
            Line((12.7, -6.34365), (12.7, -5.23875))
            ThreePointArc((12.7, -5.23875), (12.14755, -5.7912), (12.7, -6.34365))
        make_face()
        with BuildLine():
            Line((10.71245, -12.7), (9.60755, -12.7))
            ThreePointArc((9.60755, -12.7), (10.16, -12.14755), (10.71245, -12.7))
        make_face()
        with BuildLine():
            Line((6.34365, -12.7), (5.23875, -12.7))
            ThreePointArc((5.23875, -12.7), (5.7912, -12.14755), (6.34365, -12.7))
        make_face()
    extrude(amount=-CUT_EXTRUDE2_DEPTH, mode=Mode.SUBTRACT)

    # Fillet1
    fillet1_edges = [part.edges().sort_by_distance(p)[0] for p in [
        (-2.958635435, -4.5212, 38.4),
        (2.958635435, -4.5212, 38.4),
        (4.5212, -2.958635435, 38.4),
        (4.5212, 2.958635435, 38.4),
        (-4.5212, 2.958635435, 38.4),
        (-4.5212, -2.958635435, 38.4),
        (2.958635435, 4.5212, 38.4),
        (-2.958635435, 4.5212, 38.4),
    ]]
    fillet(fillet1_edges, radius=FILLET1_R)

    # Fillet2
    fillet2_edges = [part.edges().sort_by_distance(p)[0] for p in [
        (-12.7, 12.7, 38.4),
        (12.7, 12.7, 38.4),
        (12.7, -12.7, 38.4),
        (-12.7, -12.7, 38.4),
    ]]
    fillet(fillet2_edges, radius=FILLET2_R)


solid = part.part
